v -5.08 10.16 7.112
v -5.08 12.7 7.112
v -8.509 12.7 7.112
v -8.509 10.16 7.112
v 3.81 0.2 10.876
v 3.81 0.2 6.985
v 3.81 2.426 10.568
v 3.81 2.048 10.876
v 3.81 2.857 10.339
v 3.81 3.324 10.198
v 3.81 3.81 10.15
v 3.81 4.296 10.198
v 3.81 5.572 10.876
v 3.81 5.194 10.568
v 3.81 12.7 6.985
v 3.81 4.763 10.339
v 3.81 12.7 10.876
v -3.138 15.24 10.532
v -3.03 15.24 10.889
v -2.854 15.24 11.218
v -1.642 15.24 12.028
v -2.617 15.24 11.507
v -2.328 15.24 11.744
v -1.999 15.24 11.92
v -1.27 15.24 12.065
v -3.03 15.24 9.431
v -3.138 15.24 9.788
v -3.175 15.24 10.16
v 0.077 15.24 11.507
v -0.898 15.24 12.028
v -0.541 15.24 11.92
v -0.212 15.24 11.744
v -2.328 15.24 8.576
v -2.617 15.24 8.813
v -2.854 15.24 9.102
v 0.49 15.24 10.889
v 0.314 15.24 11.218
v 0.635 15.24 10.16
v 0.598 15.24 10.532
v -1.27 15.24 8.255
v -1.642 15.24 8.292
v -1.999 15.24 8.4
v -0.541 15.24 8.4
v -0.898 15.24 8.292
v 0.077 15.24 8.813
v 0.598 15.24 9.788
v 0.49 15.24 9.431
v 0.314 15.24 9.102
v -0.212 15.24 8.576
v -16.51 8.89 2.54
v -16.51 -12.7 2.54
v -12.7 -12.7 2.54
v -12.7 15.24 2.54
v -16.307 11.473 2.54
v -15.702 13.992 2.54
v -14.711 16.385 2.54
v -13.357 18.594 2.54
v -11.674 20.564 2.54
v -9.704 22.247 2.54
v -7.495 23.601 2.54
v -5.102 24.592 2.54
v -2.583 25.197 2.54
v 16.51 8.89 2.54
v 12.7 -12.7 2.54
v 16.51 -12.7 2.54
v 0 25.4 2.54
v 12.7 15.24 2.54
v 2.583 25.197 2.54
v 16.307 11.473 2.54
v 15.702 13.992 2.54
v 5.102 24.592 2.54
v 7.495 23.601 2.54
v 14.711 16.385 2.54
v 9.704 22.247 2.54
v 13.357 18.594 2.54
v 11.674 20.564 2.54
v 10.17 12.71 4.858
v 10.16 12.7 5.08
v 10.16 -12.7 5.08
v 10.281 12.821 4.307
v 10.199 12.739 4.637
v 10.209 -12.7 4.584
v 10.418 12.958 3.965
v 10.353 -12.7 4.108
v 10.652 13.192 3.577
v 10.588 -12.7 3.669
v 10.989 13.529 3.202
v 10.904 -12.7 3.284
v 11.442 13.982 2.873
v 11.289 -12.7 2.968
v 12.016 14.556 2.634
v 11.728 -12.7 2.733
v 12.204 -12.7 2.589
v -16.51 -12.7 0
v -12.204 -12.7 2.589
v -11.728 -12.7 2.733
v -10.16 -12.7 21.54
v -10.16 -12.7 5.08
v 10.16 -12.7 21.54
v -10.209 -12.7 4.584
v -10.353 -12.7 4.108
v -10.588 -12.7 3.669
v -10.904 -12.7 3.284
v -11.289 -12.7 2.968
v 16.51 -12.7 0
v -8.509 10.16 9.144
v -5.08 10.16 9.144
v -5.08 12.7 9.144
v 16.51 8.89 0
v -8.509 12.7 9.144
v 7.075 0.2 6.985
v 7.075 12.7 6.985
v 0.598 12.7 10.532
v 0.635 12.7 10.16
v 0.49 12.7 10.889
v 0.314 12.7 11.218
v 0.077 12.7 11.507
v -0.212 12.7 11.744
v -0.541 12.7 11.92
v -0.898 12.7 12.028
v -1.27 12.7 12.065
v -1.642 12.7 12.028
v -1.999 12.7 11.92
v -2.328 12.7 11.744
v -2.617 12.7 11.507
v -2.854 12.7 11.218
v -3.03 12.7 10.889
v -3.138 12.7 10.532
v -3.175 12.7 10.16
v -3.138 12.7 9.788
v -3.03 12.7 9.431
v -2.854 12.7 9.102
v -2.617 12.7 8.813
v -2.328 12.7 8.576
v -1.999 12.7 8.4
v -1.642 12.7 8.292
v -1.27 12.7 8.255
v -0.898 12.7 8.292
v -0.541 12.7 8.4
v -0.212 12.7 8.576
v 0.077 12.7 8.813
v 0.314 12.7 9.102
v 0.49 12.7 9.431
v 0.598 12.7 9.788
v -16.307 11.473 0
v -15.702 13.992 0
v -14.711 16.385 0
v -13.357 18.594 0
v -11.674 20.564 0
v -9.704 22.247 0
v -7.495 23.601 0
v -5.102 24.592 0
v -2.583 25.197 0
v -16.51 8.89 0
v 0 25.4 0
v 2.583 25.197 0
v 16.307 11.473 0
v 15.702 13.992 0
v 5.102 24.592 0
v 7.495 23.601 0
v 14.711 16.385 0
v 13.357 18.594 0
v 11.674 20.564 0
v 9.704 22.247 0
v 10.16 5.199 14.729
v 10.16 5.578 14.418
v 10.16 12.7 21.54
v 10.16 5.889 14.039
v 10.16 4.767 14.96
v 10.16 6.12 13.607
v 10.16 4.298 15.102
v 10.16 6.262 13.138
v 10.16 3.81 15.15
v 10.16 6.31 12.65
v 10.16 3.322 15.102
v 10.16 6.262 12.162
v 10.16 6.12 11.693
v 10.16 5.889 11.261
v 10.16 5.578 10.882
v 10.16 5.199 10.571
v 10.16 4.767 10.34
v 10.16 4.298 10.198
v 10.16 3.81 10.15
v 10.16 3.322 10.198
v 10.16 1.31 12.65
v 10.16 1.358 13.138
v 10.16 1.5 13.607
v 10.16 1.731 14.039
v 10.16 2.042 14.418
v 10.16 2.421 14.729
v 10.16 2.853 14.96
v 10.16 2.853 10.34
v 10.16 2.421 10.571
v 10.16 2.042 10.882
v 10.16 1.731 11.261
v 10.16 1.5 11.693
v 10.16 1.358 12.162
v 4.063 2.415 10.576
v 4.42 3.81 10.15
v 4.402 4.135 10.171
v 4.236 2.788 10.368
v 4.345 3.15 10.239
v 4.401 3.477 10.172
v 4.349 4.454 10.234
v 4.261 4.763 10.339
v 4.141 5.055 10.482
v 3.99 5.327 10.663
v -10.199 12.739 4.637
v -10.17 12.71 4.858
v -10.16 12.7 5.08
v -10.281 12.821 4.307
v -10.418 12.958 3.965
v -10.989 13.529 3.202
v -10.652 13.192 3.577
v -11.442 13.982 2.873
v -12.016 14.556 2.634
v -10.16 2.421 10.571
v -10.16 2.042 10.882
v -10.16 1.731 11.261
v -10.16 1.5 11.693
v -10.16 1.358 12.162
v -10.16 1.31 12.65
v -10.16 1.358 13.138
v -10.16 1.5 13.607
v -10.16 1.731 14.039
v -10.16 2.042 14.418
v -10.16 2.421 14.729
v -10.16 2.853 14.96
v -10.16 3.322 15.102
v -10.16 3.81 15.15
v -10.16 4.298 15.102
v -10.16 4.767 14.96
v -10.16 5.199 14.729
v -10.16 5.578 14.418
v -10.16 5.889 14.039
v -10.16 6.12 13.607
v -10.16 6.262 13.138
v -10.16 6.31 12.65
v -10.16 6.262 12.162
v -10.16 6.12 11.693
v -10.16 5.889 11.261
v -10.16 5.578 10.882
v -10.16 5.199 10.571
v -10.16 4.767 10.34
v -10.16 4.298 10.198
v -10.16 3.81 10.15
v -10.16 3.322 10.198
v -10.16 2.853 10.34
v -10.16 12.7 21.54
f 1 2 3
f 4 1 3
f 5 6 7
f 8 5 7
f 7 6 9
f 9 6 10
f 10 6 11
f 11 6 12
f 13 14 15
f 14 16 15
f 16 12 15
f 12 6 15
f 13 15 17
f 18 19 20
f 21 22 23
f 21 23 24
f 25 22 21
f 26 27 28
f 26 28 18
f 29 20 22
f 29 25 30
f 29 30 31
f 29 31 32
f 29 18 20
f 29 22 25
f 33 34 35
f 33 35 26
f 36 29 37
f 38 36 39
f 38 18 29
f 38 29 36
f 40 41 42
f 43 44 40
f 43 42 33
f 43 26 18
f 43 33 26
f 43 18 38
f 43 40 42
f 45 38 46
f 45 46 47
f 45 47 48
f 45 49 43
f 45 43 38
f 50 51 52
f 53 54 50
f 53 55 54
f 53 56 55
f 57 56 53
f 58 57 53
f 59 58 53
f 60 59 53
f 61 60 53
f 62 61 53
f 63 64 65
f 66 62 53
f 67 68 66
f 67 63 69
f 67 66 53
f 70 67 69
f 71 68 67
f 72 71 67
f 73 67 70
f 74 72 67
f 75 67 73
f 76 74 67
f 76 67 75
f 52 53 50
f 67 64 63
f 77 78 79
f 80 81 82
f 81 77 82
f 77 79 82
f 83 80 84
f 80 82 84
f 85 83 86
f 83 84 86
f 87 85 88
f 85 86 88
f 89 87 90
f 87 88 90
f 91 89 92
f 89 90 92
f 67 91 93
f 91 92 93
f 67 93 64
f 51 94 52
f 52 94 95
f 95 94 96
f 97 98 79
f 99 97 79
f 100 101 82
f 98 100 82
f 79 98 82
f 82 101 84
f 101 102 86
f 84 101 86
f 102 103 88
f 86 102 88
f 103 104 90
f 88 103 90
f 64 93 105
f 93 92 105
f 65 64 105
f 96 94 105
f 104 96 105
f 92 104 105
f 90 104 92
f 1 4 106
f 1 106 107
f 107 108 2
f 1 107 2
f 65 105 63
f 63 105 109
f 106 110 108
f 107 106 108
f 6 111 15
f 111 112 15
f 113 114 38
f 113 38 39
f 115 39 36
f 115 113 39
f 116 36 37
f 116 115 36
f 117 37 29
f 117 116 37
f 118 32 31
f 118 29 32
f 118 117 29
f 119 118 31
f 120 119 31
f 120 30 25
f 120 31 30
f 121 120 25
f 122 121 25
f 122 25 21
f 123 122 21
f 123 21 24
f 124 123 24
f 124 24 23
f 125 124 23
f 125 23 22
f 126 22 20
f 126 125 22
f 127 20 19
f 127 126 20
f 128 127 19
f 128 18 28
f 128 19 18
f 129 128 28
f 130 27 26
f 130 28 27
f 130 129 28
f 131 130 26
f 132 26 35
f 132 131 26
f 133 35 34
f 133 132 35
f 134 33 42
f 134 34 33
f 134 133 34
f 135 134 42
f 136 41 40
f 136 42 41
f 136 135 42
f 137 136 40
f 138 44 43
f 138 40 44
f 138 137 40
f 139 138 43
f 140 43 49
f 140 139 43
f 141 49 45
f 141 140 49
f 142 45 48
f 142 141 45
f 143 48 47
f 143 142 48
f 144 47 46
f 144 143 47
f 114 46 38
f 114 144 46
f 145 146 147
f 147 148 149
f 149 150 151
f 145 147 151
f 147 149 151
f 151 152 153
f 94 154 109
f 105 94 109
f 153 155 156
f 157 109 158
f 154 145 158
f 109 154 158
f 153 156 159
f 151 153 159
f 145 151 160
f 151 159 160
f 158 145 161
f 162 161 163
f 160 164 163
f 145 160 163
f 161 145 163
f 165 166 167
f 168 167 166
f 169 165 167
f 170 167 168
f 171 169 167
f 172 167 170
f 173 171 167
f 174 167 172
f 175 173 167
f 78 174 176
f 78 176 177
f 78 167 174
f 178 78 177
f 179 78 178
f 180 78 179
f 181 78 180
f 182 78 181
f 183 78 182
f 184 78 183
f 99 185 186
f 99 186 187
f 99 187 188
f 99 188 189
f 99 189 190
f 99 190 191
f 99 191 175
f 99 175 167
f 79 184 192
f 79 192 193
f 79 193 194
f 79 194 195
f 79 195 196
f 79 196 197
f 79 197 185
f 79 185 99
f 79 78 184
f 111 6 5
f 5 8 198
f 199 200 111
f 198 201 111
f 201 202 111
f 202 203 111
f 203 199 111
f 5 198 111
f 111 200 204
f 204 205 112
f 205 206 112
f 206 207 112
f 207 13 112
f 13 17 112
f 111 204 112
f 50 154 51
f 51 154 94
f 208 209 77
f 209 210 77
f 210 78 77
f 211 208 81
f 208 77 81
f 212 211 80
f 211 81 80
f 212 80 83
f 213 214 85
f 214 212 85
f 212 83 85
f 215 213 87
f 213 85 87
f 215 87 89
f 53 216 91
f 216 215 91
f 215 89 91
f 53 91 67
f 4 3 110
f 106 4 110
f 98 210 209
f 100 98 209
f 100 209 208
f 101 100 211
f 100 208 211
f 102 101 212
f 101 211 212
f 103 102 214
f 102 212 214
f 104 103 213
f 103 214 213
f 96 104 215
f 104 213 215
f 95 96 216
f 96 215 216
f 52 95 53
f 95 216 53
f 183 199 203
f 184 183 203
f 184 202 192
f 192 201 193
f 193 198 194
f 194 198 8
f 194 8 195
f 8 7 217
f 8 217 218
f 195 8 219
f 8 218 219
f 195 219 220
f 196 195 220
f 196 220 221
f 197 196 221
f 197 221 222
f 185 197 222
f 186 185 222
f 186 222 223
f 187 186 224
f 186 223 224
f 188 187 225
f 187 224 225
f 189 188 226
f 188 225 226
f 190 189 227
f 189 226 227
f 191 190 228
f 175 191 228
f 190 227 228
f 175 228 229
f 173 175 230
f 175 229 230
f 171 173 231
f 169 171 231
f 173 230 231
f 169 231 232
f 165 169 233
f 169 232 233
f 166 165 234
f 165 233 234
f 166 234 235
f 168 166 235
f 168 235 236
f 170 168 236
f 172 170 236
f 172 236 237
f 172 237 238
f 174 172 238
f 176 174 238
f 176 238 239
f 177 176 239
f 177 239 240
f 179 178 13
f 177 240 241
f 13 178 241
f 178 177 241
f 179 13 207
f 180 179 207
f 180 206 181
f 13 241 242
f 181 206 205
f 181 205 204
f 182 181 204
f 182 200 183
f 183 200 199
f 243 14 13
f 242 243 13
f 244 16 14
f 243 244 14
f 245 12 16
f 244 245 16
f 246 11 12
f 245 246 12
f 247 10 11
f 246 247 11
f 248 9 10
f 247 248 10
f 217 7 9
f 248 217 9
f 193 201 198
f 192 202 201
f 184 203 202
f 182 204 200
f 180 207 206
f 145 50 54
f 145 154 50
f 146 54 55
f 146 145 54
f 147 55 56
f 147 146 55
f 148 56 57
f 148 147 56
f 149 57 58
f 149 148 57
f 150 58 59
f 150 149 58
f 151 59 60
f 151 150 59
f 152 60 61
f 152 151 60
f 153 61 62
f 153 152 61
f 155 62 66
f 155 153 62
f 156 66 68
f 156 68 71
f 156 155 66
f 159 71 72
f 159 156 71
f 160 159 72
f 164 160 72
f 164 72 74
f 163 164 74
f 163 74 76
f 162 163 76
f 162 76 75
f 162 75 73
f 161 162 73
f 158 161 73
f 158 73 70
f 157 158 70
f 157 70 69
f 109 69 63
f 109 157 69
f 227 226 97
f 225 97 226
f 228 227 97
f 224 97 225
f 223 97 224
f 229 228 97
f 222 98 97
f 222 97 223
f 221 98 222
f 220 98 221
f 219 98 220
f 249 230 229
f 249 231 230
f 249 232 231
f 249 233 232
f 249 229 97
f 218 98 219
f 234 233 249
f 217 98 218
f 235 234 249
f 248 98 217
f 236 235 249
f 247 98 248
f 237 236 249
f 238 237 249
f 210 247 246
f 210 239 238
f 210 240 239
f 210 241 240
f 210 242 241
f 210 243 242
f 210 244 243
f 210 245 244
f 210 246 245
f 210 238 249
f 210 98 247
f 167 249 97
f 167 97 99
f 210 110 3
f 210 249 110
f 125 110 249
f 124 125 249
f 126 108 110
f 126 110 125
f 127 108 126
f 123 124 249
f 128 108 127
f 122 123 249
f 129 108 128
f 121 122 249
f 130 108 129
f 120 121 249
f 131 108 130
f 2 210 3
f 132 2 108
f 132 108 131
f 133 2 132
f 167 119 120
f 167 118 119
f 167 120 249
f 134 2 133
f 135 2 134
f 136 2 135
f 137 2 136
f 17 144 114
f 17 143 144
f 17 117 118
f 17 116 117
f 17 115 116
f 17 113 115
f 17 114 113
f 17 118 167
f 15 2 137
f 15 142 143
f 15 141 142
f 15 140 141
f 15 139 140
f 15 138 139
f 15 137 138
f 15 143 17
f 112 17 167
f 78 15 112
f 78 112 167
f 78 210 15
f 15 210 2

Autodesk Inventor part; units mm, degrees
ref_plane "YZ Plane" through (0, 0, 0) normal (1, 0, 0) x (0, 1, 0)
ref_plane "XZ Plane" through (0, 0, 0) normal (0, 1, 0) x (-1, 0, 0)
ref_plane "XY Plane" through (0, 0, 0) normal (0, 0, 1) x (1, 0, 0)
sketch "Sketch1" plane through (0, 0, 0) normal (0, 0, 1) x (1, 0, 0)
  line L0 (-19.812, 0) -> (26.416, 0) projected
  line L1 (0, 36.83) -> (0, -16.51) projected
  line L2 (-16.51, -12.7) -> (16.51, -12.7)
  line L3 (16.51, -12.7) -> (16.51, 8.89)
  arc A0 (16.51, 8.89) -> (-16.51, 8.89) centre (0, 8.89) ccw
  line L4 (-16.51, 8.89) -> (-16.51, -12.7)
  dimension "d2" = 33.02
  dimension "d3" = 8.89
  dimension "d4" = 12.7
extrude "Extrusion1" add sketch "Sketch1" along normal blind 2.54
sketch "Sketch2" plane through (0, 0, 2.54) normal (0, 0, 1) x (1, 0, 0)
  line L0 (-16.51, -12.7) -> (-16.51, 8.89) projected
  line L1 (16.51, -12.7) -> (-16.51, -12.7) projected
  line L2 (16.51, 8.89) -> (16.51, -12.7) projected
  line L3 (-10.16, -12.7) -> (-10.16, 12.7)
  line L4 (-10.16, 12.7) -> (10.16, 12.7)
  line L5 (10.16, 12.7) -> (10.16, -12.7)
  dimension "d7" = 6.35
  dimension "d8" = 6.35
  dimension "d9" = 25.4
extrude "Extrusion2" add sketch "Sketch2" along normal blind 19
sketch "Sketch3" plane through (10.16, -12.7, 21.54) normal (1, 0, 0) x (0, 0, -1)
  line L0 (0, 25.4) -> (0, 0) projected
  line L1 (19, 25.4) -> (0, 25.4) projected
  point P0 (8.89, 16.51)
  dimension "d12" = 8.89
  dimension "d13" = 8.89
hole "Hole1" at (10.16, 3.81, 12.65) direction (-1, 0, 0) diameter 5 end through all
fillet "Fillet1" radius 2.54 3 edges at (10.16, 0, 2.54) (0, 12.7, 2.54) (-10.16, 0, 2.54)
sketch "Sketch6" plane through (-10.16, 12.7, 21.54) normal (0, 1, 0) x (1, 0, 0)
  line L0 (0, 16.46) -> (20.32, 16.46) projected
  line L1 (20.32, 16.46) -> (20.32, 0) projected
  line L2 (13.97, 14.555) -> (13.97, 10.6635)
  line L3 (13.97, 10.6635) -> (17.2354, 14.555)
  line L4 (17.2354, 14.555) -> (13.97, 14.555)
  dimension "d22" = 6.35
  dimension "d23" = 1.905
  dimension "d24" = 40
  dimension "d25" = 5.08
extrude "Extrusion3" cut sketch "Sketch6" against normal blind 12.5
sketch "Sketch7" plane through (-10.16, 12.7, 21.54) normal (0, 1, 0) x (1, 0, 0)
  line L0 (0, 16.46) -> (20.32, 16.46) projected
  line L1 (0, 16.46) -> (0, 0) projected
  circle A0 centre (8.89, 11.38) radius 1.905
  dimension "d28" = 8.89
  dimension "d29" = 5.08
  dimension "d30" = 3.81
extrude "Extrusion4" add sketch "Sketch7" along normal blind 2.54
sketch "Sketch8" plane through (-10.16, 12.7, 21.54) normal (0, 1, 0) x (1, 0, 0)
  line L0 (0, 16.46) -> (20.32, 16.46) projected
  line L1 (0, 16.46) -> (0, 0) projected
  line L2 (5.08, 14.428) -> (1.651, 14.428)
  line L3 (1.651, 14.428) -> (1.651, 12.396)
  line L4 (1.651, 12.396) -> (5.08, 12.396)
  line L5 (5.08, 12.396) -> (5.08, 14.428)
  dimension "d33" = 2.032
  dimension "d34" = 1.651
  dimension "d35" = 3.429
  dimension "d36" = 2.032
extrude "Extrusion5" cut sketch "Sketch8" against normal blind 2.54
properties part number "querylab"
